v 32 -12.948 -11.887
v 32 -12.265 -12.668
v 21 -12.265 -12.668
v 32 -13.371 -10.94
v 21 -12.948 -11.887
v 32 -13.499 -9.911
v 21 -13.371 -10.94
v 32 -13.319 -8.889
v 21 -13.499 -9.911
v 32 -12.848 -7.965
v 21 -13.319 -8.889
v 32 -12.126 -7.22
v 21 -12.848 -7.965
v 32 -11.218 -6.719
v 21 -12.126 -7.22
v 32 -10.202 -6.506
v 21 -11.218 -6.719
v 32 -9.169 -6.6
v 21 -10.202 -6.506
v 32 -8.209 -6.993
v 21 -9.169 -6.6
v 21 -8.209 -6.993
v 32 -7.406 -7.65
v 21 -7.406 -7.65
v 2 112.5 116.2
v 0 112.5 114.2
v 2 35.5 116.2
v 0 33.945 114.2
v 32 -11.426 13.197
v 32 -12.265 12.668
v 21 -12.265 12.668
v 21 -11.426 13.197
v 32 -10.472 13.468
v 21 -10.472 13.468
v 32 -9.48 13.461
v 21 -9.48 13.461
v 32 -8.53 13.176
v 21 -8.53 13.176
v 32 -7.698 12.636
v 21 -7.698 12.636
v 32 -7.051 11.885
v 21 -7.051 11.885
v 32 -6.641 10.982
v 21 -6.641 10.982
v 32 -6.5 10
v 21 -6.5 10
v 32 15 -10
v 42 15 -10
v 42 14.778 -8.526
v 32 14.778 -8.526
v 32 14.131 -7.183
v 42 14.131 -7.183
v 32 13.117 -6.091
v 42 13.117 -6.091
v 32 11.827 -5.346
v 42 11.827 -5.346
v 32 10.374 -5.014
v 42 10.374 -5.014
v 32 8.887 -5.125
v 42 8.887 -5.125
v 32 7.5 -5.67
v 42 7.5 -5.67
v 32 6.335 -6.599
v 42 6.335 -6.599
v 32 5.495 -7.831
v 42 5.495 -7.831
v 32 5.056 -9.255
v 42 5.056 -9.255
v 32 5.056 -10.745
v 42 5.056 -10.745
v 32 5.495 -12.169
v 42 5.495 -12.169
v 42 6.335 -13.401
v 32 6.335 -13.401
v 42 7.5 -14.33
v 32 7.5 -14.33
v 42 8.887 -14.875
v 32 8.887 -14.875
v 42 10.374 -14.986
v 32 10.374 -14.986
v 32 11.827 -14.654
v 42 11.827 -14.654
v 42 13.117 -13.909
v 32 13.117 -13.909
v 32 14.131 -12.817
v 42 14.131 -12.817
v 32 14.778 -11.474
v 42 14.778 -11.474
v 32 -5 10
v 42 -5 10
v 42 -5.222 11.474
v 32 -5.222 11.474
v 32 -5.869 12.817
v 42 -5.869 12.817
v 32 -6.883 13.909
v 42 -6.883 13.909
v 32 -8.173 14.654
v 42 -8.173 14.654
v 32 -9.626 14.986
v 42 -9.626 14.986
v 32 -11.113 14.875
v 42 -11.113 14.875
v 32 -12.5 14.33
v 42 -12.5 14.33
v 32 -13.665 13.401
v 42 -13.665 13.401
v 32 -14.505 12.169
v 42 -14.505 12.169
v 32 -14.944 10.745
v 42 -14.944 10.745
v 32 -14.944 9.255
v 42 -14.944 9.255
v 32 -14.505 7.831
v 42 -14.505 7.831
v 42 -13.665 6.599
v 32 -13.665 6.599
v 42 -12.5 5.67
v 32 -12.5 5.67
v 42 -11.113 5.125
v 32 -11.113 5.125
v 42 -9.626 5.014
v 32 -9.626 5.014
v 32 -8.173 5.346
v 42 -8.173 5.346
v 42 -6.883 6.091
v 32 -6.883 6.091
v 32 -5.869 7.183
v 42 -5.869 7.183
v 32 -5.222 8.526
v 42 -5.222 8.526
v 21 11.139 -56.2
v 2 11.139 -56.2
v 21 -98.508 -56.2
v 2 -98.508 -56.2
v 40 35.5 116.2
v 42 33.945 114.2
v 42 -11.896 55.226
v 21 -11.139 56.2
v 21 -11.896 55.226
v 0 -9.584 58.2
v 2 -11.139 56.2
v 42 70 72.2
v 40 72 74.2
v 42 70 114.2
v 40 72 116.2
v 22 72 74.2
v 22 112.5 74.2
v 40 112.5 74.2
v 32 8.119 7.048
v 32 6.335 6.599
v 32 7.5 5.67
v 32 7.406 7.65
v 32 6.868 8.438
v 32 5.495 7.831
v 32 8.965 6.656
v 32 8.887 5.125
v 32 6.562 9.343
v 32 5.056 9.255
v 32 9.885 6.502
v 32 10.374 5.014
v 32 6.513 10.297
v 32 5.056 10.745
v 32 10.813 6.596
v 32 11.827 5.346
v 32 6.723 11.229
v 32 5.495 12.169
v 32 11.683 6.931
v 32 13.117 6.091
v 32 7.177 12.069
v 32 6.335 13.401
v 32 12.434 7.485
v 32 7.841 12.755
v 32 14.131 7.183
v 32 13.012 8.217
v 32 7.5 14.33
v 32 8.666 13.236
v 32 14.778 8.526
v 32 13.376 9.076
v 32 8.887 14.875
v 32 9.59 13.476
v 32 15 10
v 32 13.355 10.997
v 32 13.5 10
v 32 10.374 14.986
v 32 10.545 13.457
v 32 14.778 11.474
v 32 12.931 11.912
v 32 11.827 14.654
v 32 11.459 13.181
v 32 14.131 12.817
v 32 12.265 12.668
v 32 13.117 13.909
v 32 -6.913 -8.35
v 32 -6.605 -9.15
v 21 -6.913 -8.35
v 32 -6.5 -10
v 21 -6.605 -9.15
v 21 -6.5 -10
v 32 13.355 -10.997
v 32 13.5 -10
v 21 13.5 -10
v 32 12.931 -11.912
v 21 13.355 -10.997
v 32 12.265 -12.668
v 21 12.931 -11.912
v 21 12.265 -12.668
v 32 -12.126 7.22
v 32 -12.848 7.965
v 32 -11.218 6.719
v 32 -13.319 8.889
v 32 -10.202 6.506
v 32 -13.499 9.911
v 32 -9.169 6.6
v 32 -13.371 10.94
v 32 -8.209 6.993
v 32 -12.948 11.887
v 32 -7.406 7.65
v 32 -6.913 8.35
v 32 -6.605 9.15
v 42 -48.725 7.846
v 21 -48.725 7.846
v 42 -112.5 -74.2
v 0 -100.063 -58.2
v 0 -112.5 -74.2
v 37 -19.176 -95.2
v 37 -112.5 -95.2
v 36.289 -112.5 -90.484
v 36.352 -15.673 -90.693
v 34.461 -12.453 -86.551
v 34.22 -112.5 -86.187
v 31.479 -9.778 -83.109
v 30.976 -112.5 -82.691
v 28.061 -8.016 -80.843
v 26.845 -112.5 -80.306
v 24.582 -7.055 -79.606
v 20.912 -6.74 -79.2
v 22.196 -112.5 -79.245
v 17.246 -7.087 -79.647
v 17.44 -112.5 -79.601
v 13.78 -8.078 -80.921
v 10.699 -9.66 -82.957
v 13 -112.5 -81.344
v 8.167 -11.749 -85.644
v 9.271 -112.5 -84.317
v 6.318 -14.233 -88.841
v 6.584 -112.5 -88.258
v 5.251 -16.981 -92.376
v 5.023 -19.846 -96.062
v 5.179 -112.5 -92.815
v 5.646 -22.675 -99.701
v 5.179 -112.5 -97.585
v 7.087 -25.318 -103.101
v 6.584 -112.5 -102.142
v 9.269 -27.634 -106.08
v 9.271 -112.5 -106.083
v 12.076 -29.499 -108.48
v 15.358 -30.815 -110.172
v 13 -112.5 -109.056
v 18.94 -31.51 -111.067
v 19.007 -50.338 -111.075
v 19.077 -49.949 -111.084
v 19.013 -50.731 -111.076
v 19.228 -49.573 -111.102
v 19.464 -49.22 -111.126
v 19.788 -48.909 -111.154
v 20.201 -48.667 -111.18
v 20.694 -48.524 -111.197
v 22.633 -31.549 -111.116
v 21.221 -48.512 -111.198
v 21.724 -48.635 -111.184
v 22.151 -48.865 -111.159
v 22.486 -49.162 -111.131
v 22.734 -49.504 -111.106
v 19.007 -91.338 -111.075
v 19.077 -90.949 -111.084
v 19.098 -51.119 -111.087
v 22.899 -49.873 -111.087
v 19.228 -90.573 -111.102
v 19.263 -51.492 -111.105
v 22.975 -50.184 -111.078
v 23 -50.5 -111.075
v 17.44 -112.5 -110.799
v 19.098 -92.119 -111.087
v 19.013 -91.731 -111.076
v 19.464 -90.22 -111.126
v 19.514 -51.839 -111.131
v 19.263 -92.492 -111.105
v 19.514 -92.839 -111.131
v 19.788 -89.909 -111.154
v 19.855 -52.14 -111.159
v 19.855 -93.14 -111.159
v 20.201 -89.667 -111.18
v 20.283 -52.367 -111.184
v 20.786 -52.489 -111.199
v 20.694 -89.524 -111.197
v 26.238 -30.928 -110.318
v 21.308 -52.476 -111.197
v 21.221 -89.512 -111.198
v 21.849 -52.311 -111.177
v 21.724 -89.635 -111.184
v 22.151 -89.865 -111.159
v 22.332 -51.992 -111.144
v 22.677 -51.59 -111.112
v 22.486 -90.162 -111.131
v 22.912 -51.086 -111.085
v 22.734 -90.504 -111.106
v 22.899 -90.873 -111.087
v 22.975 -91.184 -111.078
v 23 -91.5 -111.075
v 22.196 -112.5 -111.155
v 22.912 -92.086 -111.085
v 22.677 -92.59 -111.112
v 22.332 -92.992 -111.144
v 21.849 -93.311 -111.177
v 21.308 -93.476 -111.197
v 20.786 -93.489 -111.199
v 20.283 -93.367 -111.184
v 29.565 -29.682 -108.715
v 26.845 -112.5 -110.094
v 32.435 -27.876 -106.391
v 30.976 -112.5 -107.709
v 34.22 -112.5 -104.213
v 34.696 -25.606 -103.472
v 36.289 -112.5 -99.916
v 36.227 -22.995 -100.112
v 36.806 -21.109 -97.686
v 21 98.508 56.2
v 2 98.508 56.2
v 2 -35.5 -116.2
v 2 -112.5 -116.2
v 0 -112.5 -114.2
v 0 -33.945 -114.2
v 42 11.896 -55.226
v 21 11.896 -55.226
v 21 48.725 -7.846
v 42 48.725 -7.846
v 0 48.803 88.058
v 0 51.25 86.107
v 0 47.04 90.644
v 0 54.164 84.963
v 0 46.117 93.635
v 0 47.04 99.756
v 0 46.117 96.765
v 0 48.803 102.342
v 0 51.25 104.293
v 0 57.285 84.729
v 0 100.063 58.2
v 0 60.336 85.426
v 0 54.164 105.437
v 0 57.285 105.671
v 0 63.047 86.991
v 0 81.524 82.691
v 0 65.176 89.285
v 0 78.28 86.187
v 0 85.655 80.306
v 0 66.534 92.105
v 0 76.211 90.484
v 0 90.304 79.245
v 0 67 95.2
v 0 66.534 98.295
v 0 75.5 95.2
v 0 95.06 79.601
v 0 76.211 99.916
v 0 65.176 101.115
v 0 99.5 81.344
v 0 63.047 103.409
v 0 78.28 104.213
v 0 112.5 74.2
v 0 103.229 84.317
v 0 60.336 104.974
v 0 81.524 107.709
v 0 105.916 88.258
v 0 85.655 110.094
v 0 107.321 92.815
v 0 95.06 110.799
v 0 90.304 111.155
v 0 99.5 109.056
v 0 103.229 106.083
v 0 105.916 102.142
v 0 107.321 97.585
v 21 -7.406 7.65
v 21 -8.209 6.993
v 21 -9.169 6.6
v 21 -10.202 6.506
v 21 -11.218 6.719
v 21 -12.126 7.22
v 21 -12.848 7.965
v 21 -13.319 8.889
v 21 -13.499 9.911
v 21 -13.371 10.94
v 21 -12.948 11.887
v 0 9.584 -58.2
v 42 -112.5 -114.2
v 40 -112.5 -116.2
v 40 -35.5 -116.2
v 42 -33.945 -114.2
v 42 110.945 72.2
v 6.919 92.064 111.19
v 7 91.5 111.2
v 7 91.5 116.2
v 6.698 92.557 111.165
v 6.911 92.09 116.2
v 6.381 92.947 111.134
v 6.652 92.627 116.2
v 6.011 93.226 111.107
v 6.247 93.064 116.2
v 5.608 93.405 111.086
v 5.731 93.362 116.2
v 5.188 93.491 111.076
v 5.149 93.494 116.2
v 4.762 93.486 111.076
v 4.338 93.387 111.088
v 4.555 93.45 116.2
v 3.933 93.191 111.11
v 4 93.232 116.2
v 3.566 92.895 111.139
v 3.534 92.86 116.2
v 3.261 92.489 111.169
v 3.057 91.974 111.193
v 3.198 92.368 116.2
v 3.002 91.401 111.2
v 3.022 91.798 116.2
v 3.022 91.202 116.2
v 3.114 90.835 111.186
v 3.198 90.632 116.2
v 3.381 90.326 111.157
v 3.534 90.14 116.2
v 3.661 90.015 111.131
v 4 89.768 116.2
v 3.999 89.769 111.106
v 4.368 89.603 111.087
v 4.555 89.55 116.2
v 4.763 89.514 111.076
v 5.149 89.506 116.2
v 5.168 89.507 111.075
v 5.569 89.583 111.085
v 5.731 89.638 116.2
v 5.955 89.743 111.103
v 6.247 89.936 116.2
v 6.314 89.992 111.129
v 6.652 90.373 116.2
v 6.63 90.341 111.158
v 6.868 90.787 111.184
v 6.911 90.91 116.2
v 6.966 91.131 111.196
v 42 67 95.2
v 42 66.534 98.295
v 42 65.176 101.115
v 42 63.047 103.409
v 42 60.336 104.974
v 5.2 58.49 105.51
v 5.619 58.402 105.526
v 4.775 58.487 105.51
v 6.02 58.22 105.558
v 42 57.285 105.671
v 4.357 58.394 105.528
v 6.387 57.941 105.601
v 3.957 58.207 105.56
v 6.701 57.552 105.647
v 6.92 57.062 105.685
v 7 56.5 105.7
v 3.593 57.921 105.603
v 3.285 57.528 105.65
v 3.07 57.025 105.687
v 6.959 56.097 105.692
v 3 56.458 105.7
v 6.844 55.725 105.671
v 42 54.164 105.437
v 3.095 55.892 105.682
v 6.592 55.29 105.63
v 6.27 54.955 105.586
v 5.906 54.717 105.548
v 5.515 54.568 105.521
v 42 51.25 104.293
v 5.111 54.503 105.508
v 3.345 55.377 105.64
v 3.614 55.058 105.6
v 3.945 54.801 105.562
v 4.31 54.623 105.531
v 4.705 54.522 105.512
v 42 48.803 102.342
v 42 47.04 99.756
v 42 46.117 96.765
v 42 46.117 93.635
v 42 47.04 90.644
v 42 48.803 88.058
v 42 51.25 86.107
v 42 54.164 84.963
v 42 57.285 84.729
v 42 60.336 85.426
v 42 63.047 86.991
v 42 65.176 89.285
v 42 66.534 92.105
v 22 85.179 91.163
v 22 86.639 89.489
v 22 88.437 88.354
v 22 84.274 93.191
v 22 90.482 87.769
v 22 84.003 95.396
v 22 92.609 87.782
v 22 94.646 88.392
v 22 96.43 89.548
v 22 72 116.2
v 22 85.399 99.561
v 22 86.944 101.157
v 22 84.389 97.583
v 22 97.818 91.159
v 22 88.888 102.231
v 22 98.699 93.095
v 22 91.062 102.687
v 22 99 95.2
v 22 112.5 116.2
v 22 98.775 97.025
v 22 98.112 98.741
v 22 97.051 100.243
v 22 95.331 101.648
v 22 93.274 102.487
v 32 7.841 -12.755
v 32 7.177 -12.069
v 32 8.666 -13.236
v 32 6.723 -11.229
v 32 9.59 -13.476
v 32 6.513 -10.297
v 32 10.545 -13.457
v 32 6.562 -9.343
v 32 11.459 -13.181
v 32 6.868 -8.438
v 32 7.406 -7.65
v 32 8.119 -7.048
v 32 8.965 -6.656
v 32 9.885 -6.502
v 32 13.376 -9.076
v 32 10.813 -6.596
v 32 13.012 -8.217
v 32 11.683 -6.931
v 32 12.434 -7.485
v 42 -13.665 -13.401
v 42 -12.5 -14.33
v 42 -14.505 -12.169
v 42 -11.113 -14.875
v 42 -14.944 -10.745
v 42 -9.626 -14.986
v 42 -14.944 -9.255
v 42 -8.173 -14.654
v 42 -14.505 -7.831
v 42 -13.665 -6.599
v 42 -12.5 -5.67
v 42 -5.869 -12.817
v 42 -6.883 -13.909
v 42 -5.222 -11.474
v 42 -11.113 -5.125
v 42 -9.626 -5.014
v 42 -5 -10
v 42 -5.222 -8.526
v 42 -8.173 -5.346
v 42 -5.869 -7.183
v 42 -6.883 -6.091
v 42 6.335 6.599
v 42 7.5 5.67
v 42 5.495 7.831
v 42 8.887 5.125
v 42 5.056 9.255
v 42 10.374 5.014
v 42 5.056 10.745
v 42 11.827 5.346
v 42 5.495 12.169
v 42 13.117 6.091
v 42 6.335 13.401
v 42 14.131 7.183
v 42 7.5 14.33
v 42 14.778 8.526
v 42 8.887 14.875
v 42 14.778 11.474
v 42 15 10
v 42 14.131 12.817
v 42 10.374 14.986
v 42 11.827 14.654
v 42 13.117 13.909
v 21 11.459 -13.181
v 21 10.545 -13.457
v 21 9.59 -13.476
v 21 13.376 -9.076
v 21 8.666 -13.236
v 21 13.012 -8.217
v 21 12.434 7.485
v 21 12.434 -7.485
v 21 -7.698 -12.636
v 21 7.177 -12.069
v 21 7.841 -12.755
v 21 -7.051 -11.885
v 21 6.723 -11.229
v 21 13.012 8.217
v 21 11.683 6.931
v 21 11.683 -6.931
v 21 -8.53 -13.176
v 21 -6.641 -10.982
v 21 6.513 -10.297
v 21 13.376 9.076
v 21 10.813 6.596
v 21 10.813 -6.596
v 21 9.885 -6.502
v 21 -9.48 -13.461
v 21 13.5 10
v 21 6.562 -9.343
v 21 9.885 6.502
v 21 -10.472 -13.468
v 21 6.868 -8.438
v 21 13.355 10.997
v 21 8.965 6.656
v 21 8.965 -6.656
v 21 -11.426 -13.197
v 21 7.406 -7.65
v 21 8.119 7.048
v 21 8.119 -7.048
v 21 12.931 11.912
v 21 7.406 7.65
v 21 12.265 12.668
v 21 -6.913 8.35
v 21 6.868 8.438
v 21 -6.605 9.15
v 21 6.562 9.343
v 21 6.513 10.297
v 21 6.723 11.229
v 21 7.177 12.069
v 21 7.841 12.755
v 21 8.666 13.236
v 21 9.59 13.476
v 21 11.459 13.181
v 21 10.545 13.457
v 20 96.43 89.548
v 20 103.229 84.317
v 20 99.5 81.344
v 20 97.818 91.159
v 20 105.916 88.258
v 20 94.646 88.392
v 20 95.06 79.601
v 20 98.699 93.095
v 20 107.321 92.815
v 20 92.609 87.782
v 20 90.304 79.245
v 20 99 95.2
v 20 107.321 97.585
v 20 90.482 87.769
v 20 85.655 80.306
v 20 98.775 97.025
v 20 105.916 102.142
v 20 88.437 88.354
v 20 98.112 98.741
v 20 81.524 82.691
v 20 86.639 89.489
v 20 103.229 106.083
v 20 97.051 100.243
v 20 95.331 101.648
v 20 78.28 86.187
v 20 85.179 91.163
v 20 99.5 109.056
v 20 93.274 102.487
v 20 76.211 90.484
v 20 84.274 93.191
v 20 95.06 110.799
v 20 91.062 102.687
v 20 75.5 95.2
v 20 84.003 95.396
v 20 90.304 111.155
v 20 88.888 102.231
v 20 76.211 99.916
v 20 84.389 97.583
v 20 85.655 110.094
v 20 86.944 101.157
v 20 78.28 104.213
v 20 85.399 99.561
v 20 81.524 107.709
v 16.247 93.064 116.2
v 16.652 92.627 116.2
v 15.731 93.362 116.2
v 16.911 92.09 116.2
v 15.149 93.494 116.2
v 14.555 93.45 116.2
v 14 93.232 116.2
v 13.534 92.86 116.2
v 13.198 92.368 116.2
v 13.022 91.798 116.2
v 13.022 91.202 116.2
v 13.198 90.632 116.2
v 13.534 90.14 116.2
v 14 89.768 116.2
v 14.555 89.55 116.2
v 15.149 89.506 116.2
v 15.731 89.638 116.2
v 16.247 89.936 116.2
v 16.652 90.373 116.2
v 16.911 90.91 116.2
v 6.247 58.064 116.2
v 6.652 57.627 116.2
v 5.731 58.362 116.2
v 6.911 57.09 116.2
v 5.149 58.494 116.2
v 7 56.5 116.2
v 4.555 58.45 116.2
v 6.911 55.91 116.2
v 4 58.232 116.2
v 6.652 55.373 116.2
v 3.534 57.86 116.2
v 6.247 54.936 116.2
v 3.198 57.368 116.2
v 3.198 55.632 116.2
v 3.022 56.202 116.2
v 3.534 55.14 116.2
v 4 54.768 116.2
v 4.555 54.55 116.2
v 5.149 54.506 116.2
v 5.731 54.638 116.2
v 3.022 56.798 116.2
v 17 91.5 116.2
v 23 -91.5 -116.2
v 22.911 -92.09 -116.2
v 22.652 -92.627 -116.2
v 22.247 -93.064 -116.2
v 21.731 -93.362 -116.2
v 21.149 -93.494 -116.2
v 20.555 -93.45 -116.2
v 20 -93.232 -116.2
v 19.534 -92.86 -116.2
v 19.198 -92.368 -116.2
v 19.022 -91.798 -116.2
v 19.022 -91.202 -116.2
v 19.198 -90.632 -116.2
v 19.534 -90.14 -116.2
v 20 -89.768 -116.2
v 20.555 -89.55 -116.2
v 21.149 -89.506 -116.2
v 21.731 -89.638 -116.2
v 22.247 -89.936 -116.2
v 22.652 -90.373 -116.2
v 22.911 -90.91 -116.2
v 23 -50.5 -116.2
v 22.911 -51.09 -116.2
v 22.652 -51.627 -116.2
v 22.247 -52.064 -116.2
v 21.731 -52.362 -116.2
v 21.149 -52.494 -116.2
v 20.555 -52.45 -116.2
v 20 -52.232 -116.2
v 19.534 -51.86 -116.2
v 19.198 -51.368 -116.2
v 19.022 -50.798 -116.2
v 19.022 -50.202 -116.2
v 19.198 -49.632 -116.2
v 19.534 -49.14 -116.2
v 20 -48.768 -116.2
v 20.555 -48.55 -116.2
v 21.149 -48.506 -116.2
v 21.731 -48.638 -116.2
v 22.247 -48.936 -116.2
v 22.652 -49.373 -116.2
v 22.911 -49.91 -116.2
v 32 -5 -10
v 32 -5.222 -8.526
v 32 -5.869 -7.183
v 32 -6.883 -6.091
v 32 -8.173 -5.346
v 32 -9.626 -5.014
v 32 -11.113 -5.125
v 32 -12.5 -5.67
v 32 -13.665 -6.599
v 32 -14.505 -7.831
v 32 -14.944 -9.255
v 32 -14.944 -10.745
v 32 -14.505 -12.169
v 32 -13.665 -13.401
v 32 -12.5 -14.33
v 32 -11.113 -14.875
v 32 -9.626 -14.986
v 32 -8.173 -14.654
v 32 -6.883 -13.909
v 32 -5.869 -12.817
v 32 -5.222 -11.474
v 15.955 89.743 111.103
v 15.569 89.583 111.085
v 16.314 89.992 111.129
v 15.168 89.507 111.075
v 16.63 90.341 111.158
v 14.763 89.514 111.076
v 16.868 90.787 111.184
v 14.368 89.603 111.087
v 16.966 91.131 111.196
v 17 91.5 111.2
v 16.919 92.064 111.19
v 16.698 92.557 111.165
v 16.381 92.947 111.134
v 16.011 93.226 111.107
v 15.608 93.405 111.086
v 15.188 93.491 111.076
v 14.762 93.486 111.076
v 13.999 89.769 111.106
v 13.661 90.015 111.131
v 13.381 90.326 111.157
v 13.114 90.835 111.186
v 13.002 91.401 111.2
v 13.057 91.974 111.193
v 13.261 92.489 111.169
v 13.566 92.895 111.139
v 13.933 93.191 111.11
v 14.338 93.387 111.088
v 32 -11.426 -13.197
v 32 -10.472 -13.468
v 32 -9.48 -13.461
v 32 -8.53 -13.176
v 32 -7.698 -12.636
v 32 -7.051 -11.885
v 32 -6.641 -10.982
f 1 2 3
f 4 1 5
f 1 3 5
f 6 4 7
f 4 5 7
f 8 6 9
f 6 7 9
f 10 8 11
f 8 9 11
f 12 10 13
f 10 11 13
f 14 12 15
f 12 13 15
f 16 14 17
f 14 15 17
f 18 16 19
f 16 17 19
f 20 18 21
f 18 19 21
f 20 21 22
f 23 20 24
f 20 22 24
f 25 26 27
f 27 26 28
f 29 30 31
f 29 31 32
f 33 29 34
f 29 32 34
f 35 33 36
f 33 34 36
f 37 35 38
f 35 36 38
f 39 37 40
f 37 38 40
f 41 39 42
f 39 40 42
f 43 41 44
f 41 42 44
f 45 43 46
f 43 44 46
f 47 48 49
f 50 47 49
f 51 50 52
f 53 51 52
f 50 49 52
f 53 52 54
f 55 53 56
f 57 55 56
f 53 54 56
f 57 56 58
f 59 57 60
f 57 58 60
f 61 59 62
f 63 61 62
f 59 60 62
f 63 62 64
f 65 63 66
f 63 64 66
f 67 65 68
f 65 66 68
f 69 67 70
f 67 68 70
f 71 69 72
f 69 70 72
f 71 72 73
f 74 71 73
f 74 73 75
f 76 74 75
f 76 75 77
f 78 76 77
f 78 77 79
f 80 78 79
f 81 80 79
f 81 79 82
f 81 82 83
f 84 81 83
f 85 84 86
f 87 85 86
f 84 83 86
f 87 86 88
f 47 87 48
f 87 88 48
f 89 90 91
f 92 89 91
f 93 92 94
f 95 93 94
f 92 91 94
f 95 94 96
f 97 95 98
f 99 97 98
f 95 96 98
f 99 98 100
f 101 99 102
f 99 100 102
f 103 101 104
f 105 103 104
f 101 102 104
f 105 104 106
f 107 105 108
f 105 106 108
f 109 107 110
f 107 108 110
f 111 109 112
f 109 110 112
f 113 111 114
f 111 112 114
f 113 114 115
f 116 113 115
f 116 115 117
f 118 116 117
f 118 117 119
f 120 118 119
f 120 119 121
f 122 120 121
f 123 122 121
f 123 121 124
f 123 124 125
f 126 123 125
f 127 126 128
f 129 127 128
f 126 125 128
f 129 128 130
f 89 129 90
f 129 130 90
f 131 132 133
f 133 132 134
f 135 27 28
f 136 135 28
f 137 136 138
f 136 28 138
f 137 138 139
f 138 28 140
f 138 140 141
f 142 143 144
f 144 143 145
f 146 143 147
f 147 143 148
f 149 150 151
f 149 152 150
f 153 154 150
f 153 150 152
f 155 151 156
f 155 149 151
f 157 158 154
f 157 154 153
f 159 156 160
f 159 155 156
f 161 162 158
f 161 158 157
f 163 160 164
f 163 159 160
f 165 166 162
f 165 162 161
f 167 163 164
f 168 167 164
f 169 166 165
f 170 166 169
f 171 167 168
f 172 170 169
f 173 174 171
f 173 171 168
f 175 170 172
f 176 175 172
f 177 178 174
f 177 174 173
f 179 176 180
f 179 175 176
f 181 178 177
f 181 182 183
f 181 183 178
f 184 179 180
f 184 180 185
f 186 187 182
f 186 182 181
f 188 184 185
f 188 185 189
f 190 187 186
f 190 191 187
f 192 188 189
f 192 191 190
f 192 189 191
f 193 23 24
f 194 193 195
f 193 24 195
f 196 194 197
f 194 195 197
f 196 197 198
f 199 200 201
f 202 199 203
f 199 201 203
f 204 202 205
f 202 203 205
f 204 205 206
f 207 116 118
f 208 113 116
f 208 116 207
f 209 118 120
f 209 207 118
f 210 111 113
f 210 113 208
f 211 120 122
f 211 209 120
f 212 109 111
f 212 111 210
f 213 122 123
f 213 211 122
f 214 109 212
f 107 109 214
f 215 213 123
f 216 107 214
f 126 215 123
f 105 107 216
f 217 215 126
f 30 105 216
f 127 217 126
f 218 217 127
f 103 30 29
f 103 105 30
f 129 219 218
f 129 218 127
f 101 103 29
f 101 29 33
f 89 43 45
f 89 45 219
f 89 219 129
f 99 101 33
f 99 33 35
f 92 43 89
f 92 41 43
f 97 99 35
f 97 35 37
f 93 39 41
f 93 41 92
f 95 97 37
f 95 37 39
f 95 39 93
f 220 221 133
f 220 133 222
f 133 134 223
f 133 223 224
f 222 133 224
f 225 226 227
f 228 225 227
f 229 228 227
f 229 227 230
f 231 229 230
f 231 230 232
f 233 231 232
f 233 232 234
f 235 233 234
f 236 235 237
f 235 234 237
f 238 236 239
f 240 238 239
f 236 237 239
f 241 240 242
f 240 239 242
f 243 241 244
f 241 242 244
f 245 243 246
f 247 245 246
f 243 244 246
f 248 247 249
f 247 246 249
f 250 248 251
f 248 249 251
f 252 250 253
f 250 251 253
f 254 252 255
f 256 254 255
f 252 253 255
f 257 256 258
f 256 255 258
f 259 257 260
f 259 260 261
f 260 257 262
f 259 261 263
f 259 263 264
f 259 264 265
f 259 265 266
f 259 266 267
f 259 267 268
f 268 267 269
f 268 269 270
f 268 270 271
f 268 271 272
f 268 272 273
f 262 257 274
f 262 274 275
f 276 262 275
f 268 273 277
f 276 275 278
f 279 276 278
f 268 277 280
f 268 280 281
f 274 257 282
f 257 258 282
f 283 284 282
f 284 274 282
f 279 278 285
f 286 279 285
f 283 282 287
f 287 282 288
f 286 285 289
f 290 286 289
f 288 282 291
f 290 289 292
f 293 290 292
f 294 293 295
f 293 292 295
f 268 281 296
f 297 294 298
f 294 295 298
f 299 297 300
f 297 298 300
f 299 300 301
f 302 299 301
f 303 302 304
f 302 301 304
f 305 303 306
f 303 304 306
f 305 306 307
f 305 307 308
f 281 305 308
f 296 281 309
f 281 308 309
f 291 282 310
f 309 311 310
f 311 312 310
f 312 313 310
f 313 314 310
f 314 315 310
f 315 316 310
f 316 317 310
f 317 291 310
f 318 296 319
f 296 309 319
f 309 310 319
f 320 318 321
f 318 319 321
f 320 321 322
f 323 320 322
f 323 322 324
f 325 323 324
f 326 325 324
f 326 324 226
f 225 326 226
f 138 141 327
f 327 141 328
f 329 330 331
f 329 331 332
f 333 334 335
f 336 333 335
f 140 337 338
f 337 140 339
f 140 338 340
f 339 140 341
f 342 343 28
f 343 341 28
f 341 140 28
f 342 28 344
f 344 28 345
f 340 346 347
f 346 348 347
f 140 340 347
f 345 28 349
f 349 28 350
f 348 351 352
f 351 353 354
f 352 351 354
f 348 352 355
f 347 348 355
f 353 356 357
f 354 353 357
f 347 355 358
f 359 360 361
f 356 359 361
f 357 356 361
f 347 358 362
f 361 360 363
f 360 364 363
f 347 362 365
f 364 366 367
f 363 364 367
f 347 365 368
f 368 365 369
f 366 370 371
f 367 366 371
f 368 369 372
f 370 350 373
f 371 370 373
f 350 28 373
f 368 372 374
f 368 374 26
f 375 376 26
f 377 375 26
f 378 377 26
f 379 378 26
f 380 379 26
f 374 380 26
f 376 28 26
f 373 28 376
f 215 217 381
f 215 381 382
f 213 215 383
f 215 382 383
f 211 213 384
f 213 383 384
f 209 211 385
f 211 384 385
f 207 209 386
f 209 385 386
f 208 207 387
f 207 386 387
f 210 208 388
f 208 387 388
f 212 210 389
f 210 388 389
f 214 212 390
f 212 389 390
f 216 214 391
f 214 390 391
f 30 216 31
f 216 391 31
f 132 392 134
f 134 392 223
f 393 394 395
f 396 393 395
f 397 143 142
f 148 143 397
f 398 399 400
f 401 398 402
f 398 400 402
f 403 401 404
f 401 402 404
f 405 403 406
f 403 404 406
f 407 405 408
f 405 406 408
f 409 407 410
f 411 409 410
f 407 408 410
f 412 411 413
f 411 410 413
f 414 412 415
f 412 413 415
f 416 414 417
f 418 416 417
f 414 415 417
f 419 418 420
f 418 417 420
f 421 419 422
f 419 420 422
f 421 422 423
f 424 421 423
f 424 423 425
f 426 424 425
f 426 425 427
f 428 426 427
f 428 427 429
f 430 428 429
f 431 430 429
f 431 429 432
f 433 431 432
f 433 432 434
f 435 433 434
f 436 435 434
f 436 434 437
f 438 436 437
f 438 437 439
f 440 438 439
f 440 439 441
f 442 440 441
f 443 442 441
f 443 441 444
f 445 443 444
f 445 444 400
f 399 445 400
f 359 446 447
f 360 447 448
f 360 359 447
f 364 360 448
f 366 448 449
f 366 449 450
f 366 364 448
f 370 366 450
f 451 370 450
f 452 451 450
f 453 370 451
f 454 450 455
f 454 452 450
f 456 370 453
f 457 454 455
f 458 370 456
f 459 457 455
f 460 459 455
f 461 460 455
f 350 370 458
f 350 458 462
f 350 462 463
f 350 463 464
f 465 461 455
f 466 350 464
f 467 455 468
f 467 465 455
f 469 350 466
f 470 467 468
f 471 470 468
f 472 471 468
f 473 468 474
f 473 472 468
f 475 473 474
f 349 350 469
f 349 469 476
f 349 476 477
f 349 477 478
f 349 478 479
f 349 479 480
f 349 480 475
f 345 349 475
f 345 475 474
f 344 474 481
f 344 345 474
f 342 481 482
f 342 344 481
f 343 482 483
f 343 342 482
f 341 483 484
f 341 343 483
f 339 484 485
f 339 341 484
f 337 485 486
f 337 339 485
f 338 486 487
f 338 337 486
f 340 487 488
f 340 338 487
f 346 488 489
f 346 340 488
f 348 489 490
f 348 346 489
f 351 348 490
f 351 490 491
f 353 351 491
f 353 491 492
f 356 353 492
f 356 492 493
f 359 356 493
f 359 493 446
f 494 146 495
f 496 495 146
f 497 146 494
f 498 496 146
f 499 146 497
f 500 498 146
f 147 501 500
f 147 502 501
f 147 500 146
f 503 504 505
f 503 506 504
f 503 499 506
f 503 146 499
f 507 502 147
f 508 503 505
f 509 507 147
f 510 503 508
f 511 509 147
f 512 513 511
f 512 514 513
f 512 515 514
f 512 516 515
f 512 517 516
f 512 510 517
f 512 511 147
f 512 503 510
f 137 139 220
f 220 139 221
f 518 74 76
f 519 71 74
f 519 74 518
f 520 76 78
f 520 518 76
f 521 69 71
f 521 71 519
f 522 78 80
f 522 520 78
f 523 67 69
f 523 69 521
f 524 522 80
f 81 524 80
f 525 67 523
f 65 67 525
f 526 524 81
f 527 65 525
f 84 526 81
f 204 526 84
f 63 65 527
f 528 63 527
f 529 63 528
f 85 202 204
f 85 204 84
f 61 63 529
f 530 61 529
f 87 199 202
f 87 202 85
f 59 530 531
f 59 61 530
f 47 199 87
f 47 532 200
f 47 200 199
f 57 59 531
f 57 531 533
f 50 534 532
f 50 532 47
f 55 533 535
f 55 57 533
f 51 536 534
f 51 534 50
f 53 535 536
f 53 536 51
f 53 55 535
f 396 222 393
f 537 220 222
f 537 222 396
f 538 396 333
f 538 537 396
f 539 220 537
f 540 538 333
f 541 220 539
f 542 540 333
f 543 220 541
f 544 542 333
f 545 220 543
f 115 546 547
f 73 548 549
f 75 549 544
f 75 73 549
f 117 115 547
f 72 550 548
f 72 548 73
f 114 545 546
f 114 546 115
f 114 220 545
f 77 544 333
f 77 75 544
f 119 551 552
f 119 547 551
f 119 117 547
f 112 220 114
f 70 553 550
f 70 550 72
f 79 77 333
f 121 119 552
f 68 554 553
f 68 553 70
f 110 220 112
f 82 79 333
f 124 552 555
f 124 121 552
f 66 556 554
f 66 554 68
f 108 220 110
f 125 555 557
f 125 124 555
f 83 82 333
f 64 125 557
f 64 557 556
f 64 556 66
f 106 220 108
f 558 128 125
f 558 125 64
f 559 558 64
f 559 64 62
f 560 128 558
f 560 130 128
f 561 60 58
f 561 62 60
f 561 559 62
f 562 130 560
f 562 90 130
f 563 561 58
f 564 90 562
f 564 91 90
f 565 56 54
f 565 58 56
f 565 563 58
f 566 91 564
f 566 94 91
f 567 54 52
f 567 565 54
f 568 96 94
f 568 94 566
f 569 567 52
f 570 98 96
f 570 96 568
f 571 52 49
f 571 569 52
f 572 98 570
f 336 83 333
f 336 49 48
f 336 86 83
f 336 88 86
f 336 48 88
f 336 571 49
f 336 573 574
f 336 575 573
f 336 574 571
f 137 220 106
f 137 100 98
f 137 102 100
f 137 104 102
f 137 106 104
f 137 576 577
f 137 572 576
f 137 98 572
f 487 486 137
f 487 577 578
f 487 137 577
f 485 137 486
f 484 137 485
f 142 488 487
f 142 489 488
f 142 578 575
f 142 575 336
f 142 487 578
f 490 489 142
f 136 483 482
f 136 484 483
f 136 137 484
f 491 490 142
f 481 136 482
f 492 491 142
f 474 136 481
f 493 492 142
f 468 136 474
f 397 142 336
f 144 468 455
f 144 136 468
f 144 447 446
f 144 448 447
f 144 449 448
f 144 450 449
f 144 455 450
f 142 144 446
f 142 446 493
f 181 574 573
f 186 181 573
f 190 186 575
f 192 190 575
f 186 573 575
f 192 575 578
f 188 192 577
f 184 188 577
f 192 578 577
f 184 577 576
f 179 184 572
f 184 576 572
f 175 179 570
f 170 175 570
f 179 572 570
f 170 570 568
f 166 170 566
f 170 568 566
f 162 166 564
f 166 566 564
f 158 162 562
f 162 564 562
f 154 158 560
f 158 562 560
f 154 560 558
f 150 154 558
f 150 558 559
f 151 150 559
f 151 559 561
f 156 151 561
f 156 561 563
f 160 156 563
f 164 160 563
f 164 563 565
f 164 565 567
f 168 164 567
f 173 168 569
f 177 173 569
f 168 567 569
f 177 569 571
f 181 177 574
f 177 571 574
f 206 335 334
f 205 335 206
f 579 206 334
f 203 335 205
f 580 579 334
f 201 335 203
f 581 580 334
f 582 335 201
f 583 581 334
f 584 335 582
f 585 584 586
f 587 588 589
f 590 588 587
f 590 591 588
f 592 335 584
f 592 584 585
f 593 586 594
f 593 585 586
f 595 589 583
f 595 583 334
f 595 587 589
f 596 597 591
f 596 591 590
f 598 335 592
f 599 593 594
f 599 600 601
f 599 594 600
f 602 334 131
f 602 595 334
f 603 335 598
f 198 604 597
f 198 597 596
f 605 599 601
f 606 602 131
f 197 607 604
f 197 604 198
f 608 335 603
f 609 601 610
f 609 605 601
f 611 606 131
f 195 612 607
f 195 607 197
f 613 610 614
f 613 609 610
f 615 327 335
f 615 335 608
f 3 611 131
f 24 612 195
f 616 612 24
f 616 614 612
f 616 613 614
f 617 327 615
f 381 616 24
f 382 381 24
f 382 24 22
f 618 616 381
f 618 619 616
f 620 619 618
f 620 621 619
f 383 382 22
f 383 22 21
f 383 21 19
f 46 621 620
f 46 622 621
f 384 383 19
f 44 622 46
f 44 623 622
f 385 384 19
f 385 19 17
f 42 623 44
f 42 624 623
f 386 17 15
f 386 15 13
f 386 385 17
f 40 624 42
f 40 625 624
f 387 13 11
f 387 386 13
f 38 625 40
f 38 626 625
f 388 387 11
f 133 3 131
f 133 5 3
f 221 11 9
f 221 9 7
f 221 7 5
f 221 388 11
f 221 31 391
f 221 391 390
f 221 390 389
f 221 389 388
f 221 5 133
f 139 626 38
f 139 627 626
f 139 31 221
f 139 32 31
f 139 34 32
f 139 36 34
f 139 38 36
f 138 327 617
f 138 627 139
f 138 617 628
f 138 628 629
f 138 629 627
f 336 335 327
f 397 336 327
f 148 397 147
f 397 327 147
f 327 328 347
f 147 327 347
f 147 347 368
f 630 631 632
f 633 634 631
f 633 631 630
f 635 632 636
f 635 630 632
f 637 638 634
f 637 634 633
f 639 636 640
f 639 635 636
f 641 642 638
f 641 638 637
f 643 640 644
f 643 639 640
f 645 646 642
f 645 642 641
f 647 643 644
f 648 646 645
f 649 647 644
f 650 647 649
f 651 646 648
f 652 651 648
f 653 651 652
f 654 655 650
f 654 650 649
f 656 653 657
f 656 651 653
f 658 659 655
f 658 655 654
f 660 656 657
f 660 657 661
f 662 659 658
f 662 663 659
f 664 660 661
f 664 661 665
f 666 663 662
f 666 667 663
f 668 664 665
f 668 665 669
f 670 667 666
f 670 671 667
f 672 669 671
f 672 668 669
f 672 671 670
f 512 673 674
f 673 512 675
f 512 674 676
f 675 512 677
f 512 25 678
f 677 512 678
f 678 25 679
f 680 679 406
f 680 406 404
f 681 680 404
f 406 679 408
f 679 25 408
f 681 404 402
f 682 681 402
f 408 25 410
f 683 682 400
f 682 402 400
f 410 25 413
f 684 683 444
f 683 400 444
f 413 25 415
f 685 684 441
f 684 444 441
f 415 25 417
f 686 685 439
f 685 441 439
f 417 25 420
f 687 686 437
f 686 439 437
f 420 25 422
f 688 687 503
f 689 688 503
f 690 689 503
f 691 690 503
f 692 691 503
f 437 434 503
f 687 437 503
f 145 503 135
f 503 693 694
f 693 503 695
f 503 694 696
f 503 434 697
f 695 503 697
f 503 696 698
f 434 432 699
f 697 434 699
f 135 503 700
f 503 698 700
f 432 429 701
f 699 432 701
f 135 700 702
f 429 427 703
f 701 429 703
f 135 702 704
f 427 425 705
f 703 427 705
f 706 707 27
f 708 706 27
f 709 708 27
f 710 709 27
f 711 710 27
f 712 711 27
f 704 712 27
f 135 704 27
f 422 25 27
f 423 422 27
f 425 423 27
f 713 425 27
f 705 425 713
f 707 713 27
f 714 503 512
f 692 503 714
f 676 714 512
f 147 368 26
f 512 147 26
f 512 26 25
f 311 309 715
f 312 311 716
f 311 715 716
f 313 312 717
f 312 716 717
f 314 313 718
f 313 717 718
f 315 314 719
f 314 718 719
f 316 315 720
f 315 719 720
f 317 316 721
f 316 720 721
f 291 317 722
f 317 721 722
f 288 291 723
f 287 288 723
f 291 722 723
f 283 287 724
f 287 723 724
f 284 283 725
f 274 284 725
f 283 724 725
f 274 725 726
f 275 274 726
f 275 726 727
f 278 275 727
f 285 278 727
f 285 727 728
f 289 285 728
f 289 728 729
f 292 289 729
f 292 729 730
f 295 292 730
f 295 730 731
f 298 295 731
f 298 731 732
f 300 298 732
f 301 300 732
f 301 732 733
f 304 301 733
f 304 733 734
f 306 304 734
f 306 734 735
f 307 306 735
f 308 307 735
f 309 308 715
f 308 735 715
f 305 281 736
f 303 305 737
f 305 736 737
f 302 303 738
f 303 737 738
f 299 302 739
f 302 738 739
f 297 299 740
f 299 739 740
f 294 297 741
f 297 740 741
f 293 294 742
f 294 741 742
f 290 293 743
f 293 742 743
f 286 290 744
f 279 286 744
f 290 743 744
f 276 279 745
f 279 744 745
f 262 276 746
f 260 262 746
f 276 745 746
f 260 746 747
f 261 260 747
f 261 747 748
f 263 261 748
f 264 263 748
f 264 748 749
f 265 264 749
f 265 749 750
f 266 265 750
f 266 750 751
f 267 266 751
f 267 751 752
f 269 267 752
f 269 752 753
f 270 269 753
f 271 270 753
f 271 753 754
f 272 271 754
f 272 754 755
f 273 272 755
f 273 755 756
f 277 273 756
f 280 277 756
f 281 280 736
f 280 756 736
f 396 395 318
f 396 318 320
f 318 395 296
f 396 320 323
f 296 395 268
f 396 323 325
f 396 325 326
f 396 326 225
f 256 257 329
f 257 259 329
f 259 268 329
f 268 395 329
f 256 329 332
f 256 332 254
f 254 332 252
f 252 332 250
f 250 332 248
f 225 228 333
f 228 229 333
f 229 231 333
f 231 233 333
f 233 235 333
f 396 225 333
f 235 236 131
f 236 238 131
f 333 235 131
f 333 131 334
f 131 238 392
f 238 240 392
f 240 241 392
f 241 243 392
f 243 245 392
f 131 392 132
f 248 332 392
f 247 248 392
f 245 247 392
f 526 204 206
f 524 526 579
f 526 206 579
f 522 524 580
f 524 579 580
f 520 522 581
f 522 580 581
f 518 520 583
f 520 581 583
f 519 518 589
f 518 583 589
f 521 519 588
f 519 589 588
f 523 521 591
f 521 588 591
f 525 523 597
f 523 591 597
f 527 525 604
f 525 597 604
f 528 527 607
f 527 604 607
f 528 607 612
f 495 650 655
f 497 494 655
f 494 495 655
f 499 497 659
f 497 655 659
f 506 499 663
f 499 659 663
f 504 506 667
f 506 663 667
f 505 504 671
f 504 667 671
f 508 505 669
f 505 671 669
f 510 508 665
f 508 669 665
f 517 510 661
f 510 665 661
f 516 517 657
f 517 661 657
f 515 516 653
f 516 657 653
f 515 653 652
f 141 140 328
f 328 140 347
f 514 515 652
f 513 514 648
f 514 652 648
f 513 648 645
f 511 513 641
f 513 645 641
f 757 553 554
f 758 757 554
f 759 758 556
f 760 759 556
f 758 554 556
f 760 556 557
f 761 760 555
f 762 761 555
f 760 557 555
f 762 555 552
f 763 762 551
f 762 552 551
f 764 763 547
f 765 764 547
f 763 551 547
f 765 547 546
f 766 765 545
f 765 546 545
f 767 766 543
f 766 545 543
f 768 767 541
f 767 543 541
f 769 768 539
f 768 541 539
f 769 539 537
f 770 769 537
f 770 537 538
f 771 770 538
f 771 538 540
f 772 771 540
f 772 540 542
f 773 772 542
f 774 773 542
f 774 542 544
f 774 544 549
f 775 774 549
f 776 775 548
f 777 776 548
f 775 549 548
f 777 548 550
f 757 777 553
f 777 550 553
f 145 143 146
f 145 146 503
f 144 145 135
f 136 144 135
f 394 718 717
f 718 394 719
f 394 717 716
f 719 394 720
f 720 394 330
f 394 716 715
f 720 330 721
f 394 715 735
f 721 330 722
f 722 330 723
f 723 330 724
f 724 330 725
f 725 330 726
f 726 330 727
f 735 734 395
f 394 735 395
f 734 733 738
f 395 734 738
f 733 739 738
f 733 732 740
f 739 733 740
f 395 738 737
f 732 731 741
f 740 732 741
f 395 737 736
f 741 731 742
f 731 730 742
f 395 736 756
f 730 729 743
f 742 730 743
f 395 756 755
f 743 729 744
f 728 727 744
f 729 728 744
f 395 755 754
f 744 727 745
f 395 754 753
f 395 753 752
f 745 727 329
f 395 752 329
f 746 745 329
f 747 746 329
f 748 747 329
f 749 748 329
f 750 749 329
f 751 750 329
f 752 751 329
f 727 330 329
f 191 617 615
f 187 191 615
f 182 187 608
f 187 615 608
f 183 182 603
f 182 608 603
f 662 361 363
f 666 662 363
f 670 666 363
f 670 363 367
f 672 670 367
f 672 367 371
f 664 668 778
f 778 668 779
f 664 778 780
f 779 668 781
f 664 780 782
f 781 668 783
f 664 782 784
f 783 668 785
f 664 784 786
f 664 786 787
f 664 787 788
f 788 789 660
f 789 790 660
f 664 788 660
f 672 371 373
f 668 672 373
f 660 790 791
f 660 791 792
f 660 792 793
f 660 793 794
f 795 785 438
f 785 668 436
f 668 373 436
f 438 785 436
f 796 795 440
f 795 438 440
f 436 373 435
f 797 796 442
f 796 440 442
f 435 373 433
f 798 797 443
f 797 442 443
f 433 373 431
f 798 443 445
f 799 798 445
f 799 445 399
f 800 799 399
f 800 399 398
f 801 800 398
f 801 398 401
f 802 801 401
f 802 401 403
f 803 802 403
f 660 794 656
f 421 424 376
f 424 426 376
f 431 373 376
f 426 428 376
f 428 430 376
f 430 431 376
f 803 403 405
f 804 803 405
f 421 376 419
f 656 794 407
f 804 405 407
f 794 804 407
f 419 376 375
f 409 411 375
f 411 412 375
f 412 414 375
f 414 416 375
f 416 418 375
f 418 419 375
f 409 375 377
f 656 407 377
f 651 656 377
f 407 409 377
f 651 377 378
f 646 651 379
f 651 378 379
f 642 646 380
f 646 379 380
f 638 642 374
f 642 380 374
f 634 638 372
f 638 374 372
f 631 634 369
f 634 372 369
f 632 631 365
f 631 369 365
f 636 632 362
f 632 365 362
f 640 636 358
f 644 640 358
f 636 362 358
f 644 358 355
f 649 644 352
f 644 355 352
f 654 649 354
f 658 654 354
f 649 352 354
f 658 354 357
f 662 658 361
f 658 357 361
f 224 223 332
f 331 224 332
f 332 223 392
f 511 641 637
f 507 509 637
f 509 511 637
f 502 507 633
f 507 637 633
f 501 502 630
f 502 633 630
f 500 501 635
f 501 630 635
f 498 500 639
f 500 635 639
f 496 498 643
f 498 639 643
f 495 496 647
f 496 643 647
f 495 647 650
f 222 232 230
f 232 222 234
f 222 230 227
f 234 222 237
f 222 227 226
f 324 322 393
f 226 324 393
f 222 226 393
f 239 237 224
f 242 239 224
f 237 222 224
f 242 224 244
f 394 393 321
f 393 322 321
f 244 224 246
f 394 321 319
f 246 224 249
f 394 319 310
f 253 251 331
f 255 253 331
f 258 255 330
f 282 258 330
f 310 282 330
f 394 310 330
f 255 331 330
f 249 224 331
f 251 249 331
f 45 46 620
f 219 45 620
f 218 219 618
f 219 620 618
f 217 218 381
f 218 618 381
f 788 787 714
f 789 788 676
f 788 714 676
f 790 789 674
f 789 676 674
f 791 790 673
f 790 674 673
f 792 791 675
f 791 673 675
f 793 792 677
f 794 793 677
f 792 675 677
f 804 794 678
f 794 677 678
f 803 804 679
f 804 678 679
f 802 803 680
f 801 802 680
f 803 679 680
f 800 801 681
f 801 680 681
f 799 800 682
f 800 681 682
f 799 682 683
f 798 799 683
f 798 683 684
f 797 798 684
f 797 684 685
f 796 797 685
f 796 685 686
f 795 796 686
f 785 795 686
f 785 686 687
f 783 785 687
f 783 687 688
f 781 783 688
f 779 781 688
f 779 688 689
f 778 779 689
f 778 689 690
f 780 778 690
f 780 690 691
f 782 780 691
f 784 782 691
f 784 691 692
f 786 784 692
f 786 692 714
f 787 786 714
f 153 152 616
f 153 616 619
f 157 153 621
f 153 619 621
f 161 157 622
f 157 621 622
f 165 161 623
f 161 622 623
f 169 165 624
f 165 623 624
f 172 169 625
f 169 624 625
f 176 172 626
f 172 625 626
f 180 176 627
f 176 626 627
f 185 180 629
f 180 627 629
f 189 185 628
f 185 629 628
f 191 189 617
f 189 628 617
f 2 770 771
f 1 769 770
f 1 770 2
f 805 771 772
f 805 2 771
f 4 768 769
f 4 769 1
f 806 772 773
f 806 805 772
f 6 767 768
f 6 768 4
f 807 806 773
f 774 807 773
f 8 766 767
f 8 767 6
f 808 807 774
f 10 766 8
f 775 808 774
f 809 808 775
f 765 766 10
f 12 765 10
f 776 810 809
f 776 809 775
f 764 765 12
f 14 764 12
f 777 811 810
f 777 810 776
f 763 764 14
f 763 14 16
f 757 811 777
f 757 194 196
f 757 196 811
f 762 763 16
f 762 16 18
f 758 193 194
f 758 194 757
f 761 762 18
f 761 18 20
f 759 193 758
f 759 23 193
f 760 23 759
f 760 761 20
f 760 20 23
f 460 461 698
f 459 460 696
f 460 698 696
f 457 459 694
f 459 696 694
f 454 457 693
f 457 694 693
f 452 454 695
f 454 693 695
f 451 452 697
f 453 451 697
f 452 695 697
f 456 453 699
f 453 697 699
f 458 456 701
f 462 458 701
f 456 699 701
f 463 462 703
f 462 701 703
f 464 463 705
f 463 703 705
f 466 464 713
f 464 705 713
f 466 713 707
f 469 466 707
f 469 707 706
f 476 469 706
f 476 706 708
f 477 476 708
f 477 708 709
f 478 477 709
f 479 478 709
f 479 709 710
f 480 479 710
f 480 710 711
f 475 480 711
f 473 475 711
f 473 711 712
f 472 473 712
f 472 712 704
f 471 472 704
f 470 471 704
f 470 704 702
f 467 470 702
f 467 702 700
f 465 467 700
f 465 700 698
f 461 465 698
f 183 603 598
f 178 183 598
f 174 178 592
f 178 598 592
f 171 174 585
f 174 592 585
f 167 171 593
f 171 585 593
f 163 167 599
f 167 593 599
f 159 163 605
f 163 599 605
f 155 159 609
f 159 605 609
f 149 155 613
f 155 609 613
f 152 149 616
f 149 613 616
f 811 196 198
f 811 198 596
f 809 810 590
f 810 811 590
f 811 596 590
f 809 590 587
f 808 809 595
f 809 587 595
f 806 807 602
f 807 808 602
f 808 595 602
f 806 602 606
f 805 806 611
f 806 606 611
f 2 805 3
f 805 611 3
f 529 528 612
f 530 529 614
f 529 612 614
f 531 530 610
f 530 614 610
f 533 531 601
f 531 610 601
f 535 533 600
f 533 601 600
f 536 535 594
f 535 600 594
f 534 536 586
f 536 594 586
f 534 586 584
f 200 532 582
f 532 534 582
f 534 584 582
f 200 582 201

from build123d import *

# Parameters (mm, degrees)
F0_R      = 10.5
F1_DEPTH  = 42
F2_R      = 5
F2_R_2    = 3.5
F3_DEPTH  = 10
F4_W      = 40.5
F4_H      = 42
F4_R      = 7.5
F5_DEPTH  = 20
F6_R      = 3.5
F7_DEPTH  = 21
F8_R      = 16
F9_DEPTH  = 150
F10_SIZE  = 2
F11_R     = 2
F12_DEPTH = 25
F13_R     = 2
F14_DEPTH = 25
F15_R     = 16
F15_R_2   = 7.5
F16_DEPTH = 20


with BuildPart() as f1:
    # F0 (on Right) → F1 (new body)
    with BuildSketch(Plane.YZ):
        Polygon((-20.6668798583, -21.3465905736), (-48.7248089568, 7.8459214502), (-112.5, -74.2), (-112.5, -116.2), align=None)
        Polygon((-35.5, -116.2), (11.8957703927, -55.2259818731), (-20.6668798583, -21.3465905736), (-112.5, -116.2), align=None)
        with BuildLine():
            Line((-12.2649513369, 12.6683319586), (-30.4089327146, 31.4090487239))
            Line((-30.4089327146, 31.4090487239), (-48.7248089568, 7.8459214502))
            Line((-48.7248089568, 7.8459214502), (-20.6668798583, -21.3465905736))
            Line((-20.6668798583, -21.3465905736), (-12.2649513369, -12.6683319586))
            ThreePointArc((-12.2649513369, -12.6683319586), (-12.5145841676, -7.5654843472), (-7.4063318963, -7.6499179231))
            Line((-7.4063318963, -7.6499179231), (0, 0))
            Line((0, 0), (-7.4063318963, 7.6499179231))
            ThreePointArc((-7.4063318963, 7.6499179231), (-12.5145841676, 7.5654843472), (-12.2649513369, 12.6683319586))
        make_face()
        with BuildLine():
            Line((11.8957703927, -55.2259818731), (30.4089327146, -31.4090487239))
            Line((30.4089327146, -31.4090487239), (12.2649513369, -12.6683319586))
            ThreePointArc((12.2649513369, -12.6683319586), (7.4854158324, -12.4345156528), (7.4063318963, -7.6499179231))
            Line((7.4063318963, -7.6499179231), (0, 0))
            Line((0, 0), (-7.4063318963, -7.6499179231))
            ThreePointArc((-7.4063318963, -7.6499179231), (-6.7344343244, -8.7406029941), (-6.5, -10))
            ThreePointArc((-6.5, -10), (-8.5298519937, -13.1762658641), (-12.2649513369, -12.6683319586))
            Line((-12.2649513369, -12.6683319586), (-20.6668798583, -21.3465905736))
            Line((-20.6668798583, -21.3465905736), (11.8957703927, -55.2259818731))
        make_face()
        with BuildLine():
            Line((20.6668798583, 21.3465905736), (-11.8957703927, 55.2259818731))
            Line((-11.8957703927, 55.2259818731), (-30.4089327146, 31.4090487239))
            Line((-30.4089327146, 31.4090487239), (-12.2649513369, 12.6683319586))
            ThreePointArc((-12.2649513369, 12.6683319586), (-8.5298519937, 13.1762658641), (-6.5, 10))
            ThreePointArc((-6.5, 10), (-6.7344343244, 8.7406029941), (-7.4063318963, 7.6499179231))
            Line((-7.4063318963, 7.6499179231), (0, 0))
            Line((0, 0), (7.4063318963, 7.6499179231))
            ThreePointArc((7.4063318963, 7.6499179231), (7.4854158324, 12.4345156528), (12.2649513369, 12.6683319586))
            Line((12.2649513369, 12.6683319586), (20.6668798583, 21.3465905736))
        make_face()
        with BuildLine():
            Line((30.4089327146, -31.4090487239), (48.7248089568, -7.8459214502))
            Line((48.7248089568, -7.8459214502), (20.6668798583, 21.3465905736))
            Line((20.6668798583, 21.3465905736), (12.2649513369, 12.6683319586))
            ThreePointArc((12.2649513369, 12.6683319586), (13.1762658641, 11.4701480063), (13.5, 10))
            ThreePointArc((13.5, 10), (11.2593970059, 6.7344343244), (7.4063318963, 7.6499179231))
            Line((7.4063318963, 7.6499179231), (0, 0))
            Line((0, 0), (7.4063318963, -7.6499179231))
            ThreePointArc((7.4063318963, -7.6499179231), (11.2593970059, -6.7344343244), (13.5, -10))
            ThreePointArc((13.5, -10), (13.1762658641, -11.4701480063), (12.2649513369, -12.6683319586))
            Line((12.2649513369, -12.6683319586), (30.4089327146, -31.4090487239))
        make_face()
        with BuildLine():
            Line((112.5, 74.2), (112.5, 116.2))
            Line((112.5, 116.2), (97.0512585066, 100.2431665641))
            ThreePointArc((97.0512585066, 100.2431665641), (98.4958715968, 97.9032906985), (99, 95.2))
            ThreePointArc((99, 95.2), (94.6458584105, 88.391654029), (86.6390467037, 89.4885086842))
            Line((86.6390467037, 89.4885086842), (20.6668798583, 21.3465905736))
            Line((20.6668798583, 21.3465905736), (48.7248089568, -7.8459214502))
            Line((48.7248089568, -7.8459214502), (112.5, 74.2))
        make_face()
        with BuildLine():
            Line((97.0512585066, 100.2431665641), (112.5, 116.2))
            Line((112.5, 116.2), (35.5, 116.2))
            Line((35.5, 116.2), (-11.8957703927, 55.2259818731))
            Line((-11.8957703927, 55.2259818731), (20.6668798583, 21.3465905736))
            Line((20.6668798583, 21.3465905736), (86.6390467037, 89.4885086842))
            ThreePointArc((86.6390467037, 89.4885086842), (86.1116053551, 100.4168192561), (97.0512585066, 100.2431665641))
        make_face()
        with Locations((56.5, 95.2)):
            Circle(F0_R, mode=Mode.SUBTRACT)
    extrude(amount=F1_DEPTH)

    # F2 (on face) → F3 (cut)
    with BuildSketch(Plane.YZ.offset(42)):
        with Locations((10, -10)):
            Circle(F2_R)
        with Locations((10, -10)):
            Circle(F2_R_2, mode=Mode.SUBTRACT)
        with Locations((-10, -10)):
            Circle(F2_R)
        with Locations((-10, -10)):
            Circle(F2_R_2, mode=Mode.SUBTRACT)
        with Locations((-10, 10)):
            Circle(F2_R)
        with Locations((-10, 10)):
            Circle(F2_R_2, mode=Mode.SUBTRACT)
        with Locations((10, 10)):
            Circle(F2_R)
        with Locations((10, 10)):
            Circle(F2_R_2, mode=Mode.SUBTRACT)
    extrude(amount=-F3_DEPTH, mode=Mode.SUBTRACT)

    # F4 (on face) → F5 (cut)
    with BuildSketch(Plane.YZ.offset(42)):
        with Locations((92.25, 95.2)):
            Rectangle(F4_W, F4_H)
        with Locations((91.5, 95.2)):
            Circle(F4_R, mode=Mode.SUBTRACT)
    extrude(amount=-F5_DEPTH, mode=Mode.SUBTRACT)

    # F6 (on face) → F7 (cut)
    with BuildSketch(Plane(origin=(0, 0, 0), x_dir=(0, -1, 0), z_dir=(-1, 0, 0))):
        Polygon((11.1386554622, 56.2), (-98.5084033613, 56.2), (-11.1386554622, -56.2), (98.5084033613, -56.2), align=None)
        with Locations((-10, -10)):
            Circle(F6_R, mode=Mode.SUBTRACT)
        with Locations((10, -10)):
            Circle(F6_R, mode=Mode.SUBTRACT)
        with Locations((-10, 10)):
            Circle(F6_R, mode=Mode.SUBTRACT)
        with Locations((10, 10)):
            Circle(F6_R, mode=Mode.SUBTRACT)
    extrude(amount=-F7_DEPTH, mode=Mode.SUBTRACT)

    # F8 (on face) → F9 (cut)
    with BuildSketch(Plane.XZ.offset(112.5)):
        with Locations((21, -95.2)):
            Circle(F8_R)
    extrude(amount=-F9_DEPTH, mode=Mode.SUBTRACT)

    # F10
    f10_edges = [f1.edges().sort_by_distance(p)[0] for p in [
        (42, -74, -116.2),
        (42, 92.25, 74.2),
        (42, 72, 95.2),
        (42, 53.75, 116.2),
        (0, -74, -116.2),
        (0, -43.684874, -56.2),
        (0, 43.684874, 56.2),
        (0, 74, 116.2),
    ]]
    chamfer(f10_edges, length=F10_SIZE)

    # F11 (on face) → F12 (cut)
    with BuildSketch(Plane(origin=(0, 0, -116.2), x_dir=(1, 0, 0), z_dir=(0, 0, -1))):
        with Locations((21, 50.5)):
            Circle(F11_R)
        with Locations((21, 91.5)):
            Circle(F11_R)
    extrude(amount=-F12_DEPTH, mode=Mode.SUBTRACT)

    # F13 (on face) → F14 (cut)
    with BuildSketch(Plane.XY.offset(116.2)):
        with Locations((5, 56.5)):
            Circle(F13_R)
        with Locations((15, 91.5)):
            Circle(F13_R)
        with Locations((5, 91.5)):
            Circle(F13_R)
    extrude(amount=-F14_DEPTH, mode=Mode.SUBTRACT)

    # F15 (on face) → F16 (cut)
    with BuildSketch(Plane(origin=(0, 0, 0), x_dir=(0, -1, 0), z_dir=(-1, 0, 0))):
        with Locations((-91.5, 95.2)):
            Circle(F15_R)
        with Locations((-91.5, 95.2)):
            Circle(F15_R_2, mode=Mode.SUBTRACT)
    extrude(amount=-F16_DEPTH, mode=Mode.SUBTRACT)


solid = f1.part
